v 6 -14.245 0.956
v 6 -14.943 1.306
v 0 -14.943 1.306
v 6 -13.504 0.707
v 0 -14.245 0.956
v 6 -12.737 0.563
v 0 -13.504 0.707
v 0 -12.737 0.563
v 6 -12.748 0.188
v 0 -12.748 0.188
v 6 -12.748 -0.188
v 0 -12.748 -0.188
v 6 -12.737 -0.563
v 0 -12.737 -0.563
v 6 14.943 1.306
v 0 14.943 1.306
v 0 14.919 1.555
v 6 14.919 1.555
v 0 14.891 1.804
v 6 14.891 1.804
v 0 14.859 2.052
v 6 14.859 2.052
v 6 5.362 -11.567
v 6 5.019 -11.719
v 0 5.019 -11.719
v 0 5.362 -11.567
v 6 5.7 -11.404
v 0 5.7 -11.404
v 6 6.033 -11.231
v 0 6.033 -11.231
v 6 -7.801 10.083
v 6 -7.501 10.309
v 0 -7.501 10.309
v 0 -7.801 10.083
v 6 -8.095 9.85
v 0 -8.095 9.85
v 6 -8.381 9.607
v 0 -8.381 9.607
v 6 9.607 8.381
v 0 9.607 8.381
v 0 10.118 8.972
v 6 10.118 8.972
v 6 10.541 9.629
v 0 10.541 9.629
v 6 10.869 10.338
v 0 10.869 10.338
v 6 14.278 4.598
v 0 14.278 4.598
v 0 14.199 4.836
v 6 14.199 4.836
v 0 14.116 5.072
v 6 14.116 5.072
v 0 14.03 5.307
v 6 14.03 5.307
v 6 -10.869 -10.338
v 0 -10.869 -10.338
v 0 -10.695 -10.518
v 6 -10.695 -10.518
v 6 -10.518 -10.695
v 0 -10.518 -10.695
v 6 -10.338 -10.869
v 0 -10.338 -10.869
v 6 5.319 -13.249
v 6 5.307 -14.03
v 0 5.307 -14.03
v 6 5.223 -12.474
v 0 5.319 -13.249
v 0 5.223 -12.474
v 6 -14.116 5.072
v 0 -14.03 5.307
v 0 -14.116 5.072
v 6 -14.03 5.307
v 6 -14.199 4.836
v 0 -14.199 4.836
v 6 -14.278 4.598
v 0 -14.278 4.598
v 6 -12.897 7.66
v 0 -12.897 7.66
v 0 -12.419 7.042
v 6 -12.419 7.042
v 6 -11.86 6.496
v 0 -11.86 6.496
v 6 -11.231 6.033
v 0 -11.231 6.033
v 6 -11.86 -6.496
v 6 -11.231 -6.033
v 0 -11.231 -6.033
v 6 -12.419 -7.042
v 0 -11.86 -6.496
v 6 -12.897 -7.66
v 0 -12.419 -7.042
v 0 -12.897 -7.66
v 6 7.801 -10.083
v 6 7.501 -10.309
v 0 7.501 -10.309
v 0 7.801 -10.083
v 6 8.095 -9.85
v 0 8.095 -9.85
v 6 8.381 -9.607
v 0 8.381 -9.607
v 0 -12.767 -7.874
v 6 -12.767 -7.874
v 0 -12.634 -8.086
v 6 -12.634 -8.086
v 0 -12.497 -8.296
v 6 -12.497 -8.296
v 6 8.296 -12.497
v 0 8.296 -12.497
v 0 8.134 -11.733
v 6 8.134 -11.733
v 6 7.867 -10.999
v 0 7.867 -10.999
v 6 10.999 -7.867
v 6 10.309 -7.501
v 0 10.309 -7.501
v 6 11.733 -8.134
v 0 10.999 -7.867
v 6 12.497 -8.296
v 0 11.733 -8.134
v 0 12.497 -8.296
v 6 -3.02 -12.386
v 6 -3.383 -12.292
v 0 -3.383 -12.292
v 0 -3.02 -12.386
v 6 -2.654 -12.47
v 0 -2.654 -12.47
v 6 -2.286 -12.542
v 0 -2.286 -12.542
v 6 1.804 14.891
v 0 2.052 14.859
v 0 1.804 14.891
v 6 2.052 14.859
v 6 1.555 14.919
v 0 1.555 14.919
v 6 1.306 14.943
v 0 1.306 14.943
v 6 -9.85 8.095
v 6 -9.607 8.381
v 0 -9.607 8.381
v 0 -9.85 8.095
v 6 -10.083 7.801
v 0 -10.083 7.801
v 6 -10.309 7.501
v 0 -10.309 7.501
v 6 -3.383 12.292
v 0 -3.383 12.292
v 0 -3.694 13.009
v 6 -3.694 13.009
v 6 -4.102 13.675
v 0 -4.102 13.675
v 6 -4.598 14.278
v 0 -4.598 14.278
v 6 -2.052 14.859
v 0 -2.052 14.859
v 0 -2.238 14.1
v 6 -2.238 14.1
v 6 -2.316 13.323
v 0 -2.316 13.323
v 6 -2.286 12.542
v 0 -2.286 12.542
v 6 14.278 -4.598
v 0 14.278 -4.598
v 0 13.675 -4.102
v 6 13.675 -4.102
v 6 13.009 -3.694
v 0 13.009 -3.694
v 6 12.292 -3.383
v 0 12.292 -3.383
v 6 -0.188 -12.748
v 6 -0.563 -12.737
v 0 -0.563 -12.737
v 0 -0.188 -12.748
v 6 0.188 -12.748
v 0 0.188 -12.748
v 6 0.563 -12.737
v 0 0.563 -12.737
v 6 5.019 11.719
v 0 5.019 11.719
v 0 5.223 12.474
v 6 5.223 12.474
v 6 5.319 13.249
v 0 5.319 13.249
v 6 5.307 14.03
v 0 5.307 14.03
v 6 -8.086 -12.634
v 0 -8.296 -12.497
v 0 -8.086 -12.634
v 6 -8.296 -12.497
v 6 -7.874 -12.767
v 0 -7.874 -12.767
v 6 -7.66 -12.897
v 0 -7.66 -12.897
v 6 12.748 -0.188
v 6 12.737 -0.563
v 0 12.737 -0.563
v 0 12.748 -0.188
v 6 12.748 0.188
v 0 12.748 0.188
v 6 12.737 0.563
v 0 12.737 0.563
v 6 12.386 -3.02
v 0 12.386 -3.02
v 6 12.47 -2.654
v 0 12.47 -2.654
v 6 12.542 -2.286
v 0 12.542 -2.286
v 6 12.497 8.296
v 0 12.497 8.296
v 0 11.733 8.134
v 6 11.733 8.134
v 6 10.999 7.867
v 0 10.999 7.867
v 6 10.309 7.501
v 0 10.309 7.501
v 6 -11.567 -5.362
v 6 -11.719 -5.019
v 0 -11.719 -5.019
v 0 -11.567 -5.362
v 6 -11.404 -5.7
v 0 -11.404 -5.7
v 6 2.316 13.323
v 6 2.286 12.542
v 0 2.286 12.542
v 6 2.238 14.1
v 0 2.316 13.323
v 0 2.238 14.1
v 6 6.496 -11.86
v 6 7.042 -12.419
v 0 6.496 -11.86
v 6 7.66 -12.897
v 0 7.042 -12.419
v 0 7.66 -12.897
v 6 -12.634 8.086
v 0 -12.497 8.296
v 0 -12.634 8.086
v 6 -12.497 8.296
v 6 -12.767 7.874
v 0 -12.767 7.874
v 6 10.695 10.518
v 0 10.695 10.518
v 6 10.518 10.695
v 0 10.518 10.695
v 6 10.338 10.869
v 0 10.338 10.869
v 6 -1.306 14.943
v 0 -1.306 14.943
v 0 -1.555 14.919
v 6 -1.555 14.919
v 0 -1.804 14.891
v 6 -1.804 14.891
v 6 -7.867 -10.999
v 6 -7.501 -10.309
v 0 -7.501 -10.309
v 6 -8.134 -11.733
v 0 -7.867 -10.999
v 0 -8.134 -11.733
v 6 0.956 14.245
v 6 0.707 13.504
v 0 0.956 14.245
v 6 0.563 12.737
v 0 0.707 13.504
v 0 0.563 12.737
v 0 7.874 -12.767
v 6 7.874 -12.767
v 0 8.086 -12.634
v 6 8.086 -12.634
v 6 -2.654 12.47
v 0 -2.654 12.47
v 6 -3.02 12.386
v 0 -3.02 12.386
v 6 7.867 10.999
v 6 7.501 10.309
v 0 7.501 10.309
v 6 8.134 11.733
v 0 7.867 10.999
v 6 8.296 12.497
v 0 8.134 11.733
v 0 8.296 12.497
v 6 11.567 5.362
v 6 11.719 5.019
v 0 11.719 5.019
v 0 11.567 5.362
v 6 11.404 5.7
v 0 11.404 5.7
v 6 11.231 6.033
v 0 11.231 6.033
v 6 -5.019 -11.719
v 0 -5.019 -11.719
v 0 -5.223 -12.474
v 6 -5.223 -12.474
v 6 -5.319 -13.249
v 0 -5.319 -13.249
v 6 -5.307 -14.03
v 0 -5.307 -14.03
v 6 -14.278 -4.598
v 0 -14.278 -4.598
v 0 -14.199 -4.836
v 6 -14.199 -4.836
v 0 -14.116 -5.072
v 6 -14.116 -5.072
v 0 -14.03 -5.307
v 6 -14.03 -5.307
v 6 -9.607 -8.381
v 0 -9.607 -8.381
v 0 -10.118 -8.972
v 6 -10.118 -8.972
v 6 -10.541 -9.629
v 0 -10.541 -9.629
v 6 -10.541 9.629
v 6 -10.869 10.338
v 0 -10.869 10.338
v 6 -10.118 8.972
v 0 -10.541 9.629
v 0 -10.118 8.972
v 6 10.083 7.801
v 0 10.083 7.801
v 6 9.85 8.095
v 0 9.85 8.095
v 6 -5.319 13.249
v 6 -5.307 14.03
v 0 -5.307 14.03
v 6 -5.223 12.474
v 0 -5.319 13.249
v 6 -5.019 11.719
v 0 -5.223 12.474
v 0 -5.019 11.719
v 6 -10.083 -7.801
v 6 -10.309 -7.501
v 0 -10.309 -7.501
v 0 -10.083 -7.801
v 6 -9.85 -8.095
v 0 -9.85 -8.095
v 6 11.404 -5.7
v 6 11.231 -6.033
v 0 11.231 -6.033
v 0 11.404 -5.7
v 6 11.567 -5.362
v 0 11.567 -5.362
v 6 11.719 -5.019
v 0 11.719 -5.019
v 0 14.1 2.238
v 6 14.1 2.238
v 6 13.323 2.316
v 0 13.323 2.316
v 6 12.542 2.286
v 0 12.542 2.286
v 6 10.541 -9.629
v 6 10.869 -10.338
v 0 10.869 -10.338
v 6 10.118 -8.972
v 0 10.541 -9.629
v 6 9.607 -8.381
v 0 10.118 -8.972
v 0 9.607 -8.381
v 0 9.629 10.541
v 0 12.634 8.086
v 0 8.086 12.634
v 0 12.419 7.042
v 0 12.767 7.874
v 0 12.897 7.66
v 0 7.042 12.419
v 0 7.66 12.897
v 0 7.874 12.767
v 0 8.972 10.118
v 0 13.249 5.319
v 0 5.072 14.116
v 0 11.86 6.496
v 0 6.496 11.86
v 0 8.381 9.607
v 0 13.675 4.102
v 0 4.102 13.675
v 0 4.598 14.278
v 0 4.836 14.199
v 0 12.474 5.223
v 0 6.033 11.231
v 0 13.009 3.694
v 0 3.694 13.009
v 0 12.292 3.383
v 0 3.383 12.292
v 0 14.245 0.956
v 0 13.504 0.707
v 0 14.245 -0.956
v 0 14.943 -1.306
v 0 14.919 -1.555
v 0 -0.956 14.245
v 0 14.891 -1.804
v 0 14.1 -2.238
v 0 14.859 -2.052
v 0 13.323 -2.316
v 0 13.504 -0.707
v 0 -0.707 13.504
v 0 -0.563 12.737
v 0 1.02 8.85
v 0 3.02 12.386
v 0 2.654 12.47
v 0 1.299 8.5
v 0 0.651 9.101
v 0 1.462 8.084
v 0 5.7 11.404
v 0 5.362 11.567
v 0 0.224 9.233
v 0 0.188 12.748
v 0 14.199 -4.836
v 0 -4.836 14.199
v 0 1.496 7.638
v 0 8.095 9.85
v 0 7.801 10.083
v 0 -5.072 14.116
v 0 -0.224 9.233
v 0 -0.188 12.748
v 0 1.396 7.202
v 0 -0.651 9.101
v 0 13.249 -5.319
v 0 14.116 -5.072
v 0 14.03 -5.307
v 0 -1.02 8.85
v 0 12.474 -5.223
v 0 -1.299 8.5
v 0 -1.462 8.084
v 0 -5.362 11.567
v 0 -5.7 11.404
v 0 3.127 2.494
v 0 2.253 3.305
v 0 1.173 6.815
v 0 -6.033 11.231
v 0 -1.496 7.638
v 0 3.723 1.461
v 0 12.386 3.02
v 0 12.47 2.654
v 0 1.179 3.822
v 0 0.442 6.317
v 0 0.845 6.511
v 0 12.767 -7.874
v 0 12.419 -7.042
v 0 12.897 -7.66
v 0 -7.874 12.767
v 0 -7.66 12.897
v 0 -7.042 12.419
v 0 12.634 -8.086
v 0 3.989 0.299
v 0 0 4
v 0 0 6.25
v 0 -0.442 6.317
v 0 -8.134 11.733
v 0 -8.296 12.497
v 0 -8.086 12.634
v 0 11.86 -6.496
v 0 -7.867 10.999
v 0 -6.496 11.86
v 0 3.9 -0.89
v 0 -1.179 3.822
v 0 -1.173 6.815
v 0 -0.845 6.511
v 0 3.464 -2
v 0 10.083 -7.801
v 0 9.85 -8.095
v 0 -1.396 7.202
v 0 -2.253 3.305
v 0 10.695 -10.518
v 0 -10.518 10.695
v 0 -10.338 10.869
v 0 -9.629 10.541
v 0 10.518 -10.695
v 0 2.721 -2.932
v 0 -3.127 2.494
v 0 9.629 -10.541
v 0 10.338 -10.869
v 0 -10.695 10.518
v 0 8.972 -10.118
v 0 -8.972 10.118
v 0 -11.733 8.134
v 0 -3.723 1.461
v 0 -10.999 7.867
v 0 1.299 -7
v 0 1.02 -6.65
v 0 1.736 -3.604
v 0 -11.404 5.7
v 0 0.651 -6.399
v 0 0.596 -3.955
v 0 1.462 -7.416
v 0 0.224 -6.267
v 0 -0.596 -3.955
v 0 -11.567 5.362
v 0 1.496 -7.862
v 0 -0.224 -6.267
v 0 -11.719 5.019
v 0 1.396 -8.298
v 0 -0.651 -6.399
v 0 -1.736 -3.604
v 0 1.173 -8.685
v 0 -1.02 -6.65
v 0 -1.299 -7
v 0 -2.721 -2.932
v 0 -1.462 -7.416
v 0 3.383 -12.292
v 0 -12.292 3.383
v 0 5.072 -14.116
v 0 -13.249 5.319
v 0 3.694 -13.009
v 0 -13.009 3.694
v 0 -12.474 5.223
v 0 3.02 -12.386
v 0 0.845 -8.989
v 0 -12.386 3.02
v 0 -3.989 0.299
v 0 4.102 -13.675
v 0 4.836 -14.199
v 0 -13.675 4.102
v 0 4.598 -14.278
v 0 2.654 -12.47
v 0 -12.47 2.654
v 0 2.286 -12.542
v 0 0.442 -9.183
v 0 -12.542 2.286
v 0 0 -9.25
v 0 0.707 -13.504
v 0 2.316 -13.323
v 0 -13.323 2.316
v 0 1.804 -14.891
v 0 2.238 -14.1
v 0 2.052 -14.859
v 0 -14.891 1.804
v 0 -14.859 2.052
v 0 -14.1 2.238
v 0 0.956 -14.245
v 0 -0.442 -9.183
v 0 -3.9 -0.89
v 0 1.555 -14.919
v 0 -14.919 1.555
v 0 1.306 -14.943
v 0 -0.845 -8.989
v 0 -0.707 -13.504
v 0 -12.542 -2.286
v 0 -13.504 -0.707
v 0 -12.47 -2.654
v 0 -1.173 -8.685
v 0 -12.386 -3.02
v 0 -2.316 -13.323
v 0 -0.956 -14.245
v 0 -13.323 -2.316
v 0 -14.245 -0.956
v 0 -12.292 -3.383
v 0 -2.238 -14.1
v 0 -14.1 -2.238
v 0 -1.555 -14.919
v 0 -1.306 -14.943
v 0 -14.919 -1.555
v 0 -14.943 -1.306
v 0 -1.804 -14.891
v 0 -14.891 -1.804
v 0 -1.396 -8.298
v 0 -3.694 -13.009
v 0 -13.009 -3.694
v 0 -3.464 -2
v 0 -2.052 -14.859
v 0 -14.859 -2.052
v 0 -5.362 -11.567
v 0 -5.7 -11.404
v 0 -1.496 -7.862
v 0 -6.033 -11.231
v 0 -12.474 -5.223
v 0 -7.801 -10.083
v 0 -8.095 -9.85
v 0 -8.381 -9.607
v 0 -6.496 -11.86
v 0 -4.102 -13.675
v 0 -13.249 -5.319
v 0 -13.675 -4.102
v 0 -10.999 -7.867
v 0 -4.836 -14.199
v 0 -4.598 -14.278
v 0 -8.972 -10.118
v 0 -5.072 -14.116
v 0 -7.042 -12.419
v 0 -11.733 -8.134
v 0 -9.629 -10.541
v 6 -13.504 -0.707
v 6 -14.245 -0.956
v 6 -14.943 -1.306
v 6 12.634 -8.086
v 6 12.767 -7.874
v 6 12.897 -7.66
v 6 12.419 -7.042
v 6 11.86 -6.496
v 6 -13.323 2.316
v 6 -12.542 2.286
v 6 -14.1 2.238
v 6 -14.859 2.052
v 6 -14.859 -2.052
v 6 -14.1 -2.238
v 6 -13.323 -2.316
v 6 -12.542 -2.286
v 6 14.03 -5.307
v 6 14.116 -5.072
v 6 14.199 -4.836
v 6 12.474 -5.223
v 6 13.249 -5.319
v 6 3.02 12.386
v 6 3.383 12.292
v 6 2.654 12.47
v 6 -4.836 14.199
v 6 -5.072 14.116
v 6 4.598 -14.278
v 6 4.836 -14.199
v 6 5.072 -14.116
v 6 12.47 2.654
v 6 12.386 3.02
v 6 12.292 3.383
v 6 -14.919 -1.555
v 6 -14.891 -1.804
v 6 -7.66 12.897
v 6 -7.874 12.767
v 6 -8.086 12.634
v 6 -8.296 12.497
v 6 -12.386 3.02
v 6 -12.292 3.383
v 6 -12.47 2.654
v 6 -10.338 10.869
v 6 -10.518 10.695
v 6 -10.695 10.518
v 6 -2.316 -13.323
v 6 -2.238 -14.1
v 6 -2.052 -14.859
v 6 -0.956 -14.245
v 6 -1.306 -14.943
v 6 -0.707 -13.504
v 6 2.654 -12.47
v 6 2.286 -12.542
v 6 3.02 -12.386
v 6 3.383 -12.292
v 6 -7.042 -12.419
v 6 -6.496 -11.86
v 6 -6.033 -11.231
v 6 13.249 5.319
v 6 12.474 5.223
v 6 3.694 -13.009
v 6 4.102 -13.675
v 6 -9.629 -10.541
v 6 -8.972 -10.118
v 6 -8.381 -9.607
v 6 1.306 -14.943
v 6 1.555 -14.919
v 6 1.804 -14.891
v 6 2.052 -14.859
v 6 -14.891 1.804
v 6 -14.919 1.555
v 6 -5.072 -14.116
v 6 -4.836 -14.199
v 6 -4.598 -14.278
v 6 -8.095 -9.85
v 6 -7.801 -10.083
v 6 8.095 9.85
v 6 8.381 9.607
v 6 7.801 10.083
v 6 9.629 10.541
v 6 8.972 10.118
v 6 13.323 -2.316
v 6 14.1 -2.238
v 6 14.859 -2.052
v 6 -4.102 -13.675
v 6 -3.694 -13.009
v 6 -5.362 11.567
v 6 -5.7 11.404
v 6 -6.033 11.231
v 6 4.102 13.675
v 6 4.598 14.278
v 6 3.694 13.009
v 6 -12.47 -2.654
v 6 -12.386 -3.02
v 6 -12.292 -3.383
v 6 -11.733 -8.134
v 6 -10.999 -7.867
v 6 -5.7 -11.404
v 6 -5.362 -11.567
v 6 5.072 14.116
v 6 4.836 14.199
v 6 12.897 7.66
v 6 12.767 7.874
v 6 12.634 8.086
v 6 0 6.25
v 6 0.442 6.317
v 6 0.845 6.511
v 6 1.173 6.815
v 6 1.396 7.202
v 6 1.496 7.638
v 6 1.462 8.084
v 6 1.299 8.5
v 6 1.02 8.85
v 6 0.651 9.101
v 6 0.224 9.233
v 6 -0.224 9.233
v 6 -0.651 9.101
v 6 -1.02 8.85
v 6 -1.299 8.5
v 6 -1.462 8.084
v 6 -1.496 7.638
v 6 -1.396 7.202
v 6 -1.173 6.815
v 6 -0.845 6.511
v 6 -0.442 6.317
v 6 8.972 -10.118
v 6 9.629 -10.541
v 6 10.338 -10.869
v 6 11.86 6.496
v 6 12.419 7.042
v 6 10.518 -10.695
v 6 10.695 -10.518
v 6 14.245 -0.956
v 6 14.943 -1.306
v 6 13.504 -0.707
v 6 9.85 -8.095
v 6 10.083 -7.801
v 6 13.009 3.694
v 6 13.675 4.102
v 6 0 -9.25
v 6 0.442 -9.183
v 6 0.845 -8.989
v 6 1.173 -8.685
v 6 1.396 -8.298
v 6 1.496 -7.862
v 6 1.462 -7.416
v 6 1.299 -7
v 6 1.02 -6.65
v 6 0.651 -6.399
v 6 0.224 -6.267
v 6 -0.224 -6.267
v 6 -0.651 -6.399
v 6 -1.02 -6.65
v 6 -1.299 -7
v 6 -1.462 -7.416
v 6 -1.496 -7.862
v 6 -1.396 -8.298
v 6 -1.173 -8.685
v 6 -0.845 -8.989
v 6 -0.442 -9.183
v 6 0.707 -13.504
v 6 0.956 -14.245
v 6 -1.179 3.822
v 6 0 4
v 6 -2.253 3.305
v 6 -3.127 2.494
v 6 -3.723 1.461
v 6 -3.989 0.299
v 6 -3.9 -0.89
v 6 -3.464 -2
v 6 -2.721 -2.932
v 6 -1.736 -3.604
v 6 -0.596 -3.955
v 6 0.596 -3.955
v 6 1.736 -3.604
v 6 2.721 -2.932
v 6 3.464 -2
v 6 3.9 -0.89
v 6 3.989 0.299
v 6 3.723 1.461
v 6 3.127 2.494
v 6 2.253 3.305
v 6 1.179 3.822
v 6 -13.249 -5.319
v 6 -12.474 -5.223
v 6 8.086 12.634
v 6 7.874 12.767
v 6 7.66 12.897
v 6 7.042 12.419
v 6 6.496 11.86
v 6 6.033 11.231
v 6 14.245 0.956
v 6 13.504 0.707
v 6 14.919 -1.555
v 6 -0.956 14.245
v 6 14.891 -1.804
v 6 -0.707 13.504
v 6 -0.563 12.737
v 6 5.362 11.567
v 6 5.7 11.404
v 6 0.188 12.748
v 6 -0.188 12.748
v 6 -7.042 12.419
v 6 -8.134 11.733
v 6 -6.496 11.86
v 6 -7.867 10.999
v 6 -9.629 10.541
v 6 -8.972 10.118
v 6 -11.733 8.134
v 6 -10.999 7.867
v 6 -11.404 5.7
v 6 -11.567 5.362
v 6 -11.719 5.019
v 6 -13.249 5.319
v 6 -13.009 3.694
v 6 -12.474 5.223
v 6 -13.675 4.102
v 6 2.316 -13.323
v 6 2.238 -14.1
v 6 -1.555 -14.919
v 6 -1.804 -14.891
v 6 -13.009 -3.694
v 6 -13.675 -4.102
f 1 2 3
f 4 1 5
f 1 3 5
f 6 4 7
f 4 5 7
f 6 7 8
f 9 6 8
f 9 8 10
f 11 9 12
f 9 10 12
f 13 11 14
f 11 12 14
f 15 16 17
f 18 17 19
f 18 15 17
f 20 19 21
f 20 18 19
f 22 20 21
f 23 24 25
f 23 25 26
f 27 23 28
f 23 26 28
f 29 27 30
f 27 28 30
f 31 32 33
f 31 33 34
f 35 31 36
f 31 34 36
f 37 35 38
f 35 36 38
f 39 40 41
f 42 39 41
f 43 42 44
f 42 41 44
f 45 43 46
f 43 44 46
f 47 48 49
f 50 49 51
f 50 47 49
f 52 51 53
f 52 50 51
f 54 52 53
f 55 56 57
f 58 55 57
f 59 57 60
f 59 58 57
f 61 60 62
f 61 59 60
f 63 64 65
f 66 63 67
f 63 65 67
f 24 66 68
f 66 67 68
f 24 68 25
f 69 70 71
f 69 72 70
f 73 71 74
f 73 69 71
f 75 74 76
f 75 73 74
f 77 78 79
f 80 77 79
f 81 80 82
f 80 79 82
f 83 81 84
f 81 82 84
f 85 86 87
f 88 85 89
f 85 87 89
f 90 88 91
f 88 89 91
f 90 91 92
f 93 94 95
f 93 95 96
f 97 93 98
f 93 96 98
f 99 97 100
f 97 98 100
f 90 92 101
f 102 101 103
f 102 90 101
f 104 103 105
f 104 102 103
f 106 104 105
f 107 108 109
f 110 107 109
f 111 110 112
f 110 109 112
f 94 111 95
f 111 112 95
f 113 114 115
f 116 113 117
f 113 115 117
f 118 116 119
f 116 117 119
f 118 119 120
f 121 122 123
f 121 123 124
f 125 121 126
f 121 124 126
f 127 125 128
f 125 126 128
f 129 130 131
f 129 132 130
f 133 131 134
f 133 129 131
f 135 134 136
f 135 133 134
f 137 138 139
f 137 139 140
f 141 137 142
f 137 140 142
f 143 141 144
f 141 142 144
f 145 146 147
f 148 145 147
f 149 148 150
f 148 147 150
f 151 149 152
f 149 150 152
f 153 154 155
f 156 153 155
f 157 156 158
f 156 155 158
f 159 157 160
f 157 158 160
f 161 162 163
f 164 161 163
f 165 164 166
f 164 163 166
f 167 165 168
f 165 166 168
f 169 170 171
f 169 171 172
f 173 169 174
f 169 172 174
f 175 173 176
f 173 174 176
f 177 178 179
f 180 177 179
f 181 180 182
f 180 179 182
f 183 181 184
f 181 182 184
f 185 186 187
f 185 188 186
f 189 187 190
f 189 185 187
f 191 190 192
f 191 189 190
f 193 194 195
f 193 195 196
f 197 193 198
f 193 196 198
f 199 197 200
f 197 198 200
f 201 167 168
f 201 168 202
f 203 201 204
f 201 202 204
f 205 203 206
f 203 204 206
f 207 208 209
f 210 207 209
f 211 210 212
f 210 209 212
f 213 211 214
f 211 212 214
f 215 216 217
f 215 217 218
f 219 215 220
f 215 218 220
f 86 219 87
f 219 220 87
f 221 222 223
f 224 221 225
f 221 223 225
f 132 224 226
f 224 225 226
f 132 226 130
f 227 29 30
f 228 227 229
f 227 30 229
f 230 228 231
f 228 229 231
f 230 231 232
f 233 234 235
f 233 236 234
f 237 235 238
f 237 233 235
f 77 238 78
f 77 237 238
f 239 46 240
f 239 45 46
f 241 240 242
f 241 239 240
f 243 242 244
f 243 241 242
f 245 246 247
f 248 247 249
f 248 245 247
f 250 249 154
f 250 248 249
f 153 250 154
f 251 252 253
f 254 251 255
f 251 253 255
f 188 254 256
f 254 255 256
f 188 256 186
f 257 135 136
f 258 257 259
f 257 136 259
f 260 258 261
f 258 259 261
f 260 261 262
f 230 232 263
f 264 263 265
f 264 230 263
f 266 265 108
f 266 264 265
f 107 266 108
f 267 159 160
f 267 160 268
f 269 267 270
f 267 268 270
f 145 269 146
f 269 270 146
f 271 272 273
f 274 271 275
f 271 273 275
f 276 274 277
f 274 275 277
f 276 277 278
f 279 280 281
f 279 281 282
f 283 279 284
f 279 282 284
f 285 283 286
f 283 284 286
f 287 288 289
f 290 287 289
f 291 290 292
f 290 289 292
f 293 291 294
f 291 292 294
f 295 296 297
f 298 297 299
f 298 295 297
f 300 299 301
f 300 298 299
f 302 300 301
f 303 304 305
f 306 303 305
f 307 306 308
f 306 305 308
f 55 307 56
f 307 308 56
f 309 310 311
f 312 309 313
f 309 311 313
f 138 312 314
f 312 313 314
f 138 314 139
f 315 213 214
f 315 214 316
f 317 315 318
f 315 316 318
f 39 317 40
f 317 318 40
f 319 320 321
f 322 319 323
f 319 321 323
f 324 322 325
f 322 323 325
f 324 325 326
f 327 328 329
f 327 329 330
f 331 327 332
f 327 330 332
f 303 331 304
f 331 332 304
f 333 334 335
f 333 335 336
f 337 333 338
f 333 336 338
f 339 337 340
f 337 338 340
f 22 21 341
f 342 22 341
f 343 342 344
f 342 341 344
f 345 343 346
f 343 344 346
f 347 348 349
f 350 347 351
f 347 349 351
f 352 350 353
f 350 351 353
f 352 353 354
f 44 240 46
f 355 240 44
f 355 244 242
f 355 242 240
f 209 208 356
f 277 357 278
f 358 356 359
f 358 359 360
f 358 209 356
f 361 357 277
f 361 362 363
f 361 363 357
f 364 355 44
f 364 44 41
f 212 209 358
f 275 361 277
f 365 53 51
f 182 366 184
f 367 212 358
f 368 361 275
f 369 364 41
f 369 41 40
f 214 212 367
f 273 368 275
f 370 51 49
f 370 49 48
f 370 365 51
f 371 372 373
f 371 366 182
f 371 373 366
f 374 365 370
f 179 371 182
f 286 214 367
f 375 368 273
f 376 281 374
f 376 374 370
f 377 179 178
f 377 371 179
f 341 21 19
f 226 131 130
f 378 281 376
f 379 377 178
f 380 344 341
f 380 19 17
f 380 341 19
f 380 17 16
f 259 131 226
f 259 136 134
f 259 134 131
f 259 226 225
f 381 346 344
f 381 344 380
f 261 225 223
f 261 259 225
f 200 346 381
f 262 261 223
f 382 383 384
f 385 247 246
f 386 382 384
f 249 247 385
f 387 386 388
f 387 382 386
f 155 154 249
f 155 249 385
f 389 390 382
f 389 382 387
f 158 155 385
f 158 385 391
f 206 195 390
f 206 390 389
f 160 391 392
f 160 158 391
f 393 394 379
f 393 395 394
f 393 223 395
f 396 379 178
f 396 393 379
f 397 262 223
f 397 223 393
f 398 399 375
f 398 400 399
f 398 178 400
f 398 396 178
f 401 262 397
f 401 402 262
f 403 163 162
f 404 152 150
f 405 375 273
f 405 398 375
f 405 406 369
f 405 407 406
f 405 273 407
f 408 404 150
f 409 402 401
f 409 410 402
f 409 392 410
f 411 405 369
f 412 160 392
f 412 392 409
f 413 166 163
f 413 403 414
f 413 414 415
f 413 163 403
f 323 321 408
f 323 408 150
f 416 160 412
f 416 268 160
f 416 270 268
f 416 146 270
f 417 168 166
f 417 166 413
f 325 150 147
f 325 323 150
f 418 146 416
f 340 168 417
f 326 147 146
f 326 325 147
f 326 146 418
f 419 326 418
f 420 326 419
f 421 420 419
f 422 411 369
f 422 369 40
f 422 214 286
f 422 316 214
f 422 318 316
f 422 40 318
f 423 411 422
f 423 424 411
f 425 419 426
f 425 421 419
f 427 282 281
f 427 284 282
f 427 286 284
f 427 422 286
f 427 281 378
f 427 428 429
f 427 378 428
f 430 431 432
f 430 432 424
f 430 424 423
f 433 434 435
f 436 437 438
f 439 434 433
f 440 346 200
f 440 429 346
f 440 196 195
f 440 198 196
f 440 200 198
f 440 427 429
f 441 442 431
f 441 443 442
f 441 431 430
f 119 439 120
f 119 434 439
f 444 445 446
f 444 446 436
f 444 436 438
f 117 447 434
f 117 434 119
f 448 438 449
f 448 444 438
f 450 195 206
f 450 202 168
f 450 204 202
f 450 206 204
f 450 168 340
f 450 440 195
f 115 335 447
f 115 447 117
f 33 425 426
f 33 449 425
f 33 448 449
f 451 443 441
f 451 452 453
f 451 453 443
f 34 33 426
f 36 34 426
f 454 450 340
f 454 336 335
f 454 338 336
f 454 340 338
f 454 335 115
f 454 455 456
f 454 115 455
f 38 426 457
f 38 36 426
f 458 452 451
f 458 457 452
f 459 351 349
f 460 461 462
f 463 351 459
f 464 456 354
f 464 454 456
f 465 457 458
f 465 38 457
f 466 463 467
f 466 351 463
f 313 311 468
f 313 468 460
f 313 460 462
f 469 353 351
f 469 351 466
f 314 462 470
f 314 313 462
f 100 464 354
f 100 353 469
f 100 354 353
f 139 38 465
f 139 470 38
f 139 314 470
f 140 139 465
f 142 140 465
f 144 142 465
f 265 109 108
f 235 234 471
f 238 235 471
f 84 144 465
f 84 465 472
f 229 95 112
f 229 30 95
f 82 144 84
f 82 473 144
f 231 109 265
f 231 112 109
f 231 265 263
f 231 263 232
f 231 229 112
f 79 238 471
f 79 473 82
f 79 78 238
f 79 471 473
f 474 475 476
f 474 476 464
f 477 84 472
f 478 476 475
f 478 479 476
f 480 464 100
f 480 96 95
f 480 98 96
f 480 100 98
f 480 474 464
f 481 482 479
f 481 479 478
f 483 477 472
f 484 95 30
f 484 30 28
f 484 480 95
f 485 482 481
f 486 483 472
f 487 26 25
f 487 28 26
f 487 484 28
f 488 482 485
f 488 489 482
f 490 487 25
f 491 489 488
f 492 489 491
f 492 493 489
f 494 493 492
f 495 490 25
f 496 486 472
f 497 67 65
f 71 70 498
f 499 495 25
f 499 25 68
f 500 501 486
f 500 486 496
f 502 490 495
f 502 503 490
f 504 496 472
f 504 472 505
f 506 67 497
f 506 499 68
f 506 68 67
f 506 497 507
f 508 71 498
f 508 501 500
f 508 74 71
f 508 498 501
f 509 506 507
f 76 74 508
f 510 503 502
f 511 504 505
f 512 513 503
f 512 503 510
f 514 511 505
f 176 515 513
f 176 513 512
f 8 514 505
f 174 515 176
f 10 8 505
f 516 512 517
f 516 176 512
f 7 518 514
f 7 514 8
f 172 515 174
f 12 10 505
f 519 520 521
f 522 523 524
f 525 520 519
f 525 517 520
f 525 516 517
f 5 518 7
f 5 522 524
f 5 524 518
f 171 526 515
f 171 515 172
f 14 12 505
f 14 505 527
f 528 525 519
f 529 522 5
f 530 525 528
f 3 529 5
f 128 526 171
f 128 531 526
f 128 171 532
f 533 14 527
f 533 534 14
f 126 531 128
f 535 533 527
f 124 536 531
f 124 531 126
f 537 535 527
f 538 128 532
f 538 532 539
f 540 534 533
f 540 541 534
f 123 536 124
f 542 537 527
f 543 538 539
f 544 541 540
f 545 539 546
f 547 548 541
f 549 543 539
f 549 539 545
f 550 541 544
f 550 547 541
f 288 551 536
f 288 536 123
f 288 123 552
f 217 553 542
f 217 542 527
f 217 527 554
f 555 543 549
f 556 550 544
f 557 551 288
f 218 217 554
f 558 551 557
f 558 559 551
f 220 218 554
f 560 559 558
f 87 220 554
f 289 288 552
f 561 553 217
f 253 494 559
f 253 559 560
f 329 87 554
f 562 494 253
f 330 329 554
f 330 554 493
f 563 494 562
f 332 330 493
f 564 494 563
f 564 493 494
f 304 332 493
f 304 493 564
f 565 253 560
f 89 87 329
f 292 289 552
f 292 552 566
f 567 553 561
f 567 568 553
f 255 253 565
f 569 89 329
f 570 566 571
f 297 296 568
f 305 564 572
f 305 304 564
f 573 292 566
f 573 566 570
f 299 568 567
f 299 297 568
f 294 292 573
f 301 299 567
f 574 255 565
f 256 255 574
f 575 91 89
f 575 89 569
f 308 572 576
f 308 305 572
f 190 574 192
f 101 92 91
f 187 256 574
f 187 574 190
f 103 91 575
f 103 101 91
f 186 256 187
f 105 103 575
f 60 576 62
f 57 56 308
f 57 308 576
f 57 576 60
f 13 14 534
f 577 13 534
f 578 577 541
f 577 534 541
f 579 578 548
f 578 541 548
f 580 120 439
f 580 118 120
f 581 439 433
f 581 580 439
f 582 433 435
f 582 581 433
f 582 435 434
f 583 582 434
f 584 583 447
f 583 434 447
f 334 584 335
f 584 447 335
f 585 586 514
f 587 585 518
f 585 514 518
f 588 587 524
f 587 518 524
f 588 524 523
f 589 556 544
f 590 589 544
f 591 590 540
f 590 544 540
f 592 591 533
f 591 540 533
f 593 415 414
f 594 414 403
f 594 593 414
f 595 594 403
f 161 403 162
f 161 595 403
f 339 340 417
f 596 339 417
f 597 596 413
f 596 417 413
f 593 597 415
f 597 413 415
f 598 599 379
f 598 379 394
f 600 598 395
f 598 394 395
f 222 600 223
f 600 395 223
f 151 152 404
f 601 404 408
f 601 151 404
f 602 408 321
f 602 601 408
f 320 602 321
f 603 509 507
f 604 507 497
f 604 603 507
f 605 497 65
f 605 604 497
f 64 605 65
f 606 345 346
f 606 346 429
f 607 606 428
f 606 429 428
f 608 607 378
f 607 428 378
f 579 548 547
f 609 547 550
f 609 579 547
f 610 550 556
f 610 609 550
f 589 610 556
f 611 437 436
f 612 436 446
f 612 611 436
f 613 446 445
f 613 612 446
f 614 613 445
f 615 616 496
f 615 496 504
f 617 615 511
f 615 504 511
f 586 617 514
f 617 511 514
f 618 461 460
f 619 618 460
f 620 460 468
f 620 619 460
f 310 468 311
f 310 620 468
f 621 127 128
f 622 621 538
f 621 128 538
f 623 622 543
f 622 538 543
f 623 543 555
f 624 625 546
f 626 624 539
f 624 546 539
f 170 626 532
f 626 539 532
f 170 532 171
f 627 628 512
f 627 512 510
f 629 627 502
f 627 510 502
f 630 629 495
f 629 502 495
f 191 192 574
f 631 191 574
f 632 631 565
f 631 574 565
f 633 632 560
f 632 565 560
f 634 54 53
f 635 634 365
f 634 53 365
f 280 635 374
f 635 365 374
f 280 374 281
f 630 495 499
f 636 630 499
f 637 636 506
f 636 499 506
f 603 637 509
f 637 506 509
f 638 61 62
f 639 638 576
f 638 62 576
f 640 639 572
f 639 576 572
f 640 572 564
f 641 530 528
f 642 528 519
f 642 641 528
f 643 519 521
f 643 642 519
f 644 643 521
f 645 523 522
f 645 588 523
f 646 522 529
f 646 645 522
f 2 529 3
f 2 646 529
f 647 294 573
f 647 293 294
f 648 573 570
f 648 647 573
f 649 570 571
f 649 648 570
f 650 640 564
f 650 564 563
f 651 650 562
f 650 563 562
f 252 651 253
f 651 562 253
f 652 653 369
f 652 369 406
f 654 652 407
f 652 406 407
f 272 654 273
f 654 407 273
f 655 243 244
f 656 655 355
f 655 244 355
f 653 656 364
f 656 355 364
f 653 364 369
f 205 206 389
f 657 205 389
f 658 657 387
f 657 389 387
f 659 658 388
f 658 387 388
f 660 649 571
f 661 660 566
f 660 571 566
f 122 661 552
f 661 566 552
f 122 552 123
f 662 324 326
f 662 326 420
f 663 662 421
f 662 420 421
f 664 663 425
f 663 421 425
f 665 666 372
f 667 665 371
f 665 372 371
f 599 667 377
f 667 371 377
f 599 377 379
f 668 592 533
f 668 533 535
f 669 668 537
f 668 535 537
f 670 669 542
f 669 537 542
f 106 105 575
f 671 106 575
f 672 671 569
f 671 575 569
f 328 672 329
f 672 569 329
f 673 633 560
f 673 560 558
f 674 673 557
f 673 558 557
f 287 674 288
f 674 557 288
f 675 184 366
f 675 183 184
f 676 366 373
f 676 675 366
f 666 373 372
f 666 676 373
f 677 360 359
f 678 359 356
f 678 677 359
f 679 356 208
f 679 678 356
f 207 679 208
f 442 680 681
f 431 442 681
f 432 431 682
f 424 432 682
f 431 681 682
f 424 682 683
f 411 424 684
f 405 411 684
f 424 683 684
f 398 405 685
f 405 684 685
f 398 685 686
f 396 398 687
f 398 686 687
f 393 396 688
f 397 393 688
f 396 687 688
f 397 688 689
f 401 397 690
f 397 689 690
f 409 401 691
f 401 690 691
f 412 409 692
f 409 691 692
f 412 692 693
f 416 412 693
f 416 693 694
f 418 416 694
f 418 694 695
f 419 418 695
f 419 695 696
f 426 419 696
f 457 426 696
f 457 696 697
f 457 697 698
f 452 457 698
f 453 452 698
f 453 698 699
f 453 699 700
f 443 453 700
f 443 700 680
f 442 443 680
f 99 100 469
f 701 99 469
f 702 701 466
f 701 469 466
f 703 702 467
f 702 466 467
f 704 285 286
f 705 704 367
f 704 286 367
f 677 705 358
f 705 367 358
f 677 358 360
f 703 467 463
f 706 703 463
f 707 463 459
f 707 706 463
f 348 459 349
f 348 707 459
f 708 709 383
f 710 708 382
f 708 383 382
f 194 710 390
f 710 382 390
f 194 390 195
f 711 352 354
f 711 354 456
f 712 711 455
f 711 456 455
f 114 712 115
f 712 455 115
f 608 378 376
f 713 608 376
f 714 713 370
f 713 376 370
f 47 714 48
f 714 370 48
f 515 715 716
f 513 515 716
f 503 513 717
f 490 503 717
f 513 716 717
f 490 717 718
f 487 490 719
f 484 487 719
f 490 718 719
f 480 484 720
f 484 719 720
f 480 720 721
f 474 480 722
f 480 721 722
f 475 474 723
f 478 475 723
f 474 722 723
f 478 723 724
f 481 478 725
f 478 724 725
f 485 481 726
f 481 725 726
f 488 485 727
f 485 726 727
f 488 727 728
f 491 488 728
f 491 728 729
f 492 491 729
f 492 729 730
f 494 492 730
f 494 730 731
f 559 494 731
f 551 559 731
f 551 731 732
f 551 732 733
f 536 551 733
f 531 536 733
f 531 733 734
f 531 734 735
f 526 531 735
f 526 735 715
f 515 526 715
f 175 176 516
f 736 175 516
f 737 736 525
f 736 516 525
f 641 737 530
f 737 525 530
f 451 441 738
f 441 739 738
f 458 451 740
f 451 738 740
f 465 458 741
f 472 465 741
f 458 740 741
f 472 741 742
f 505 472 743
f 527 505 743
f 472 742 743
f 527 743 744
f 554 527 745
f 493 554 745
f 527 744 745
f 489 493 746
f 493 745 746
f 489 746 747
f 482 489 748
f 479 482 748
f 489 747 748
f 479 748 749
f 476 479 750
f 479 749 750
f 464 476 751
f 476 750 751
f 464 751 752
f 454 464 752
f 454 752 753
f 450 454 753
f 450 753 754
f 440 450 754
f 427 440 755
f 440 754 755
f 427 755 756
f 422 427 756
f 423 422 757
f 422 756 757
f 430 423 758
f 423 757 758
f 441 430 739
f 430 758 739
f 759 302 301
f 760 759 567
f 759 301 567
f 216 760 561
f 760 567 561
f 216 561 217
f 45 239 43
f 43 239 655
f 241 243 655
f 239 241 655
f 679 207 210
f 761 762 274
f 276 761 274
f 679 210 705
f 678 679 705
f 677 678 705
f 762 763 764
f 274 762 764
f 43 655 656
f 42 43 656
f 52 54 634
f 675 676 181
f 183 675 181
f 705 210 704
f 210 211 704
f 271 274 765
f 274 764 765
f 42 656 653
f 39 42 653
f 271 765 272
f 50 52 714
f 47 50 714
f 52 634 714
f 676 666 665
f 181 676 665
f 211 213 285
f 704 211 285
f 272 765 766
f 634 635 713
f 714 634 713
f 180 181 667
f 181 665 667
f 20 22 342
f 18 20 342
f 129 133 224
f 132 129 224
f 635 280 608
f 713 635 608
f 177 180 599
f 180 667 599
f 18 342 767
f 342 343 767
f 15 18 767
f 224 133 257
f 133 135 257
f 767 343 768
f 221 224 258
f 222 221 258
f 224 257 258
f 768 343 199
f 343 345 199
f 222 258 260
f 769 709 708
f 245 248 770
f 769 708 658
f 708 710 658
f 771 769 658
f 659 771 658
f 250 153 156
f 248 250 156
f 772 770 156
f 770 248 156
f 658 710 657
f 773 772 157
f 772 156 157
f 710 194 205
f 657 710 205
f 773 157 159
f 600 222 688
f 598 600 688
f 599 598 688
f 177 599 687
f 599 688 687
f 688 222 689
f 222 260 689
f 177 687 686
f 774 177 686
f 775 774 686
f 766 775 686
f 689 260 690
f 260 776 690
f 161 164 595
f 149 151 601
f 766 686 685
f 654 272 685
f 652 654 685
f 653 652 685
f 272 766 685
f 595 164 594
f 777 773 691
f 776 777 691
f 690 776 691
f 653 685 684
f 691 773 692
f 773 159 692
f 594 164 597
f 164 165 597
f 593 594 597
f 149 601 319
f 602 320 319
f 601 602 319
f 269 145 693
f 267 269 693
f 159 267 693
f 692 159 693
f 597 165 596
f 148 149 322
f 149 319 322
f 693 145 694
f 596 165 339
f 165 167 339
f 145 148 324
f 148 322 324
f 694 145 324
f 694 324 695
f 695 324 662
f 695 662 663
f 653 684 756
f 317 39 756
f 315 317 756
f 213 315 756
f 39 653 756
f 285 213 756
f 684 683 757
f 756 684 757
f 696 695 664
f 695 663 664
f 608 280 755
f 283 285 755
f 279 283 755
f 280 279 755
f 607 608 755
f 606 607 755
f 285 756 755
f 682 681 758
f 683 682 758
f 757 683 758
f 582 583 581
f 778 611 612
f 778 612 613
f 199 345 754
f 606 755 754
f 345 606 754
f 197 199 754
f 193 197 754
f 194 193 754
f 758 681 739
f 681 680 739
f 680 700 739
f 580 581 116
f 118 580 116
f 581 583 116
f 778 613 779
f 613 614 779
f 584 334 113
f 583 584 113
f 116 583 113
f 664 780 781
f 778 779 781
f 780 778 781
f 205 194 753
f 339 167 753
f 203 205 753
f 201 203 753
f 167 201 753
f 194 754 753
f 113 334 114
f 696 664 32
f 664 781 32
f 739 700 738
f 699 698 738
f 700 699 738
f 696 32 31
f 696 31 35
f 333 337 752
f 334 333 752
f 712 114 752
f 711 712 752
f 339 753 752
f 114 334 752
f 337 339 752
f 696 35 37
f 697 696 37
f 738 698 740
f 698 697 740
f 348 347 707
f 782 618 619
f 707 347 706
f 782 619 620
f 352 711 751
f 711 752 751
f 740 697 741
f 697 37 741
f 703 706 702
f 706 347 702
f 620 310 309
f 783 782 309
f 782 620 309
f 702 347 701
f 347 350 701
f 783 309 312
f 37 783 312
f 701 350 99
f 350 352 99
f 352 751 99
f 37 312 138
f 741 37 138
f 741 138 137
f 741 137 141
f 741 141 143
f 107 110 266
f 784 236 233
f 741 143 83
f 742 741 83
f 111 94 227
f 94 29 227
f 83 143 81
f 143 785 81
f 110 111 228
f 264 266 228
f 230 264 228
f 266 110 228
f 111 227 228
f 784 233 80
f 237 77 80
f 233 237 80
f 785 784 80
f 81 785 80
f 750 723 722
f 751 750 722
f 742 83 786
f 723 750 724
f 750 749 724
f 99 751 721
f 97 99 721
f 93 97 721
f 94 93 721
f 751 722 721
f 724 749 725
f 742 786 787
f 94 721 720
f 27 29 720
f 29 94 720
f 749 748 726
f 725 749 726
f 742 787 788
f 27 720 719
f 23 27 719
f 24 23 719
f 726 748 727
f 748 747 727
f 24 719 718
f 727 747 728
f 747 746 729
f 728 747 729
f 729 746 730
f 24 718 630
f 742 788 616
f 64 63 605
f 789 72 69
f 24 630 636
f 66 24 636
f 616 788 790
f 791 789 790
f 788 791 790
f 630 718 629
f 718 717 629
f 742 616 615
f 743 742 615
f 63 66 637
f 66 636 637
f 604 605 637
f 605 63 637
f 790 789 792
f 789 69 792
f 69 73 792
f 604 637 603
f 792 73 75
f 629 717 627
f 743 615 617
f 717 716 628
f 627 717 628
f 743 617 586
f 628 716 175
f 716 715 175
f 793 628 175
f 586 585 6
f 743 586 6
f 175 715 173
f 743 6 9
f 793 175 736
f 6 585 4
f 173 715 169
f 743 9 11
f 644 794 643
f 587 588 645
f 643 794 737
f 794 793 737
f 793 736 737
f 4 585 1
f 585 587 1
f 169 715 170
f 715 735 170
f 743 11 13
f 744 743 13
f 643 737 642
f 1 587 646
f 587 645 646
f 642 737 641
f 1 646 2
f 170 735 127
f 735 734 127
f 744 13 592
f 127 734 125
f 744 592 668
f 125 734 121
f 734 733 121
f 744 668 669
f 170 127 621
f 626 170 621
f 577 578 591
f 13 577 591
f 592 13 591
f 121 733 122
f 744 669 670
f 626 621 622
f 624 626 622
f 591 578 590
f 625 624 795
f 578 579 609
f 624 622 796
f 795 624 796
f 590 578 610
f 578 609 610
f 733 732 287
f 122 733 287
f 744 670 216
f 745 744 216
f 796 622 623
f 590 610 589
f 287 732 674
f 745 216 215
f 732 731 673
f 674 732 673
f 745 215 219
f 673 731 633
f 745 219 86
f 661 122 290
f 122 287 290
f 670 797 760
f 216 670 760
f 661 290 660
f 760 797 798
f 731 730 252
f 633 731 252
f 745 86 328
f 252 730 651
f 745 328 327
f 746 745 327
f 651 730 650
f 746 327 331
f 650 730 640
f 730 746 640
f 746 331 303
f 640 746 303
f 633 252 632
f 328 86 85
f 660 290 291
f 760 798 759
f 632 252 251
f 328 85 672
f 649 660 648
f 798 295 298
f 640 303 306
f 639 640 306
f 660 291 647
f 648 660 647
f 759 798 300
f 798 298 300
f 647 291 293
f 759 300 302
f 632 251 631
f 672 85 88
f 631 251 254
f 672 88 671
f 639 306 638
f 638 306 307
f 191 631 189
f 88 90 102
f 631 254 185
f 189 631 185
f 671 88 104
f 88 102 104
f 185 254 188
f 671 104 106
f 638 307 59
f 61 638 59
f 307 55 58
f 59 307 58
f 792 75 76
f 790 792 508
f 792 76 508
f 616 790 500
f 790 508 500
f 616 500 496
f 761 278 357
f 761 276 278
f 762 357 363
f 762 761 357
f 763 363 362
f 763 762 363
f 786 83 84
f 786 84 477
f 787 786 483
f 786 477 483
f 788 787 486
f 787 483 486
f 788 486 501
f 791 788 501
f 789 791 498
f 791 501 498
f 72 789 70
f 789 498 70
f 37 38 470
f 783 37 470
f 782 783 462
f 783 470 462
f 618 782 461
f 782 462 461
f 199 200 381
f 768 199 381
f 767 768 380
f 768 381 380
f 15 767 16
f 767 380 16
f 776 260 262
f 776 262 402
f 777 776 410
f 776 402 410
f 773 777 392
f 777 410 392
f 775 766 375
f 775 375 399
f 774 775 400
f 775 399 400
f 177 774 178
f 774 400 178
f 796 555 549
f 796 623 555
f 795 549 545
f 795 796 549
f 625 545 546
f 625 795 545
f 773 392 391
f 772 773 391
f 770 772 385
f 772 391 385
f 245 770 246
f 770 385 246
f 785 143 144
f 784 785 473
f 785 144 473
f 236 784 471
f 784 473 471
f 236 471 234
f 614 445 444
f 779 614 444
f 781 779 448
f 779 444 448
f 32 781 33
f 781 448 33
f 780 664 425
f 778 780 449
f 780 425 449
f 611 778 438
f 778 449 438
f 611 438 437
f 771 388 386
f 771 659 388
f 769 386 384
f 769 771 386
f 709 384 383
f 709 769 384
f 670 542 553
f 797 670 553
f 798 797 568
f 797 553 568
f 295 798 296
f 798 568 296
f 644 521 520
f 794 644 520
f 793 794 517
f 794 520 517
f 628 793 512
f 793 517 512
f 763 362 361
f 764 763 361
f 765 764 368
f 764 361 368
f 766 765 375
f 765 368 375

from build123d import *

# Parameters (mm, degrees)
BASPROSKE_W           = 6
BASPROSKE_H           = 15
TOOTHCUT_DEPTH        = 23.045407685
TEETHCUTS_COUNT       = 28
TEETHCUTS_ANGLE       = 347.142857143
BORSKE_R              = 4
BORE_DEPTH            = 50.0000508
CROQUIS1_R            = 1.5
CORTAR_EXTRUIR1_DEPTH = 10


with BuildPart() as part:
    # BasProSke → Base-Revolve (revolve)
    with BuildSketch(Plane(origin=(0, 0, 0), x_dir=(1, 0, 0), z_dir=(0, 1, 0)), mode=Mode.PRIVATE) as base_revolve_sk:
        with Locations((3, 7.5)):
            Rectangle(BASPROSKE_W, BASPROSKE_H)
    revolve(base_revolve_sk.sketch.rotate(Axis((-10, 0, 0), (1, 0, 0)), 180), axis=Axis((-10, 0, 0), (1, 0, 0)))

    # TooCutSke → ToothCut (cut, through all)
    with BuildSketch(Plane(origin=(0, 0, 0), x_dir=(0, 0, -1), z_dir=(1, 0, 0))):
        with BuildLine():
            ThreePointArc((0.562705027, 12.736575837), (0, 12.749), (-0.562705027, 12.736575837))
            ThreePointArc((-0.562705027, 12.736575837), (-0.822951015, 13.892219122), (-1.32045988, 14.96726531))
            ThreePointArc((-1.32045988, 14.96726531), (0, 15.0254), (1.32045988, 14.96726531))
            ThreePointArc((1.32045988, 14.96726531), (0.822951015, 13.892219122), (0.562705027, 12.736575837))
        make_face()
    toothcut = extrude(amount=TOOTHCUT_DEPTH, mode=Mode.SUBTRACT)

    # TeethCuts: ToothCut ×28 about axis
    teethcuts_axis = Axis((-10, 0, 0), (1, 0, 0))
    for i in range(1, TEETHCUTS_COUNT):
        add(toothcut.rotate(teethcuts_axis, i * TEETHCUTS_ANGLE / (TEETHCUTS_COUNT - 1)), mode=Mode.SUBTRACT)

    # BorSke → Bore (cut, symmetric)
    with BuildSketch(Plane(origin=(0, 0, 0), x_dir=(0, 0, -1), z_dir=(1, 0, 0))):
        with Locations(Location((0, 0, 0), (0, 0, 180))):
            Circle(BORSKE_R)
    extrude(amount=BORE_DEPTH, both=True, mode=Mode.SUBTRACT)

    # Croquis1 → Cortar-Extruir1 (cut)
    with BuildSketch(Plane(origin=(6, 0, 0), x_dir=(0, 0, -1), z_dir=(1, 0, 0))):
        with Locations((-7.75, 0)):
            Circle(CROQUIS1_R)
        with Locations((7.75, 0)):
            Circle(CROQUIS1_R)
    extrude(amount=-CORTAR_EXTRUIR1_DEPTH, mode=Mode.SUBTRACT)


solid = part.part
